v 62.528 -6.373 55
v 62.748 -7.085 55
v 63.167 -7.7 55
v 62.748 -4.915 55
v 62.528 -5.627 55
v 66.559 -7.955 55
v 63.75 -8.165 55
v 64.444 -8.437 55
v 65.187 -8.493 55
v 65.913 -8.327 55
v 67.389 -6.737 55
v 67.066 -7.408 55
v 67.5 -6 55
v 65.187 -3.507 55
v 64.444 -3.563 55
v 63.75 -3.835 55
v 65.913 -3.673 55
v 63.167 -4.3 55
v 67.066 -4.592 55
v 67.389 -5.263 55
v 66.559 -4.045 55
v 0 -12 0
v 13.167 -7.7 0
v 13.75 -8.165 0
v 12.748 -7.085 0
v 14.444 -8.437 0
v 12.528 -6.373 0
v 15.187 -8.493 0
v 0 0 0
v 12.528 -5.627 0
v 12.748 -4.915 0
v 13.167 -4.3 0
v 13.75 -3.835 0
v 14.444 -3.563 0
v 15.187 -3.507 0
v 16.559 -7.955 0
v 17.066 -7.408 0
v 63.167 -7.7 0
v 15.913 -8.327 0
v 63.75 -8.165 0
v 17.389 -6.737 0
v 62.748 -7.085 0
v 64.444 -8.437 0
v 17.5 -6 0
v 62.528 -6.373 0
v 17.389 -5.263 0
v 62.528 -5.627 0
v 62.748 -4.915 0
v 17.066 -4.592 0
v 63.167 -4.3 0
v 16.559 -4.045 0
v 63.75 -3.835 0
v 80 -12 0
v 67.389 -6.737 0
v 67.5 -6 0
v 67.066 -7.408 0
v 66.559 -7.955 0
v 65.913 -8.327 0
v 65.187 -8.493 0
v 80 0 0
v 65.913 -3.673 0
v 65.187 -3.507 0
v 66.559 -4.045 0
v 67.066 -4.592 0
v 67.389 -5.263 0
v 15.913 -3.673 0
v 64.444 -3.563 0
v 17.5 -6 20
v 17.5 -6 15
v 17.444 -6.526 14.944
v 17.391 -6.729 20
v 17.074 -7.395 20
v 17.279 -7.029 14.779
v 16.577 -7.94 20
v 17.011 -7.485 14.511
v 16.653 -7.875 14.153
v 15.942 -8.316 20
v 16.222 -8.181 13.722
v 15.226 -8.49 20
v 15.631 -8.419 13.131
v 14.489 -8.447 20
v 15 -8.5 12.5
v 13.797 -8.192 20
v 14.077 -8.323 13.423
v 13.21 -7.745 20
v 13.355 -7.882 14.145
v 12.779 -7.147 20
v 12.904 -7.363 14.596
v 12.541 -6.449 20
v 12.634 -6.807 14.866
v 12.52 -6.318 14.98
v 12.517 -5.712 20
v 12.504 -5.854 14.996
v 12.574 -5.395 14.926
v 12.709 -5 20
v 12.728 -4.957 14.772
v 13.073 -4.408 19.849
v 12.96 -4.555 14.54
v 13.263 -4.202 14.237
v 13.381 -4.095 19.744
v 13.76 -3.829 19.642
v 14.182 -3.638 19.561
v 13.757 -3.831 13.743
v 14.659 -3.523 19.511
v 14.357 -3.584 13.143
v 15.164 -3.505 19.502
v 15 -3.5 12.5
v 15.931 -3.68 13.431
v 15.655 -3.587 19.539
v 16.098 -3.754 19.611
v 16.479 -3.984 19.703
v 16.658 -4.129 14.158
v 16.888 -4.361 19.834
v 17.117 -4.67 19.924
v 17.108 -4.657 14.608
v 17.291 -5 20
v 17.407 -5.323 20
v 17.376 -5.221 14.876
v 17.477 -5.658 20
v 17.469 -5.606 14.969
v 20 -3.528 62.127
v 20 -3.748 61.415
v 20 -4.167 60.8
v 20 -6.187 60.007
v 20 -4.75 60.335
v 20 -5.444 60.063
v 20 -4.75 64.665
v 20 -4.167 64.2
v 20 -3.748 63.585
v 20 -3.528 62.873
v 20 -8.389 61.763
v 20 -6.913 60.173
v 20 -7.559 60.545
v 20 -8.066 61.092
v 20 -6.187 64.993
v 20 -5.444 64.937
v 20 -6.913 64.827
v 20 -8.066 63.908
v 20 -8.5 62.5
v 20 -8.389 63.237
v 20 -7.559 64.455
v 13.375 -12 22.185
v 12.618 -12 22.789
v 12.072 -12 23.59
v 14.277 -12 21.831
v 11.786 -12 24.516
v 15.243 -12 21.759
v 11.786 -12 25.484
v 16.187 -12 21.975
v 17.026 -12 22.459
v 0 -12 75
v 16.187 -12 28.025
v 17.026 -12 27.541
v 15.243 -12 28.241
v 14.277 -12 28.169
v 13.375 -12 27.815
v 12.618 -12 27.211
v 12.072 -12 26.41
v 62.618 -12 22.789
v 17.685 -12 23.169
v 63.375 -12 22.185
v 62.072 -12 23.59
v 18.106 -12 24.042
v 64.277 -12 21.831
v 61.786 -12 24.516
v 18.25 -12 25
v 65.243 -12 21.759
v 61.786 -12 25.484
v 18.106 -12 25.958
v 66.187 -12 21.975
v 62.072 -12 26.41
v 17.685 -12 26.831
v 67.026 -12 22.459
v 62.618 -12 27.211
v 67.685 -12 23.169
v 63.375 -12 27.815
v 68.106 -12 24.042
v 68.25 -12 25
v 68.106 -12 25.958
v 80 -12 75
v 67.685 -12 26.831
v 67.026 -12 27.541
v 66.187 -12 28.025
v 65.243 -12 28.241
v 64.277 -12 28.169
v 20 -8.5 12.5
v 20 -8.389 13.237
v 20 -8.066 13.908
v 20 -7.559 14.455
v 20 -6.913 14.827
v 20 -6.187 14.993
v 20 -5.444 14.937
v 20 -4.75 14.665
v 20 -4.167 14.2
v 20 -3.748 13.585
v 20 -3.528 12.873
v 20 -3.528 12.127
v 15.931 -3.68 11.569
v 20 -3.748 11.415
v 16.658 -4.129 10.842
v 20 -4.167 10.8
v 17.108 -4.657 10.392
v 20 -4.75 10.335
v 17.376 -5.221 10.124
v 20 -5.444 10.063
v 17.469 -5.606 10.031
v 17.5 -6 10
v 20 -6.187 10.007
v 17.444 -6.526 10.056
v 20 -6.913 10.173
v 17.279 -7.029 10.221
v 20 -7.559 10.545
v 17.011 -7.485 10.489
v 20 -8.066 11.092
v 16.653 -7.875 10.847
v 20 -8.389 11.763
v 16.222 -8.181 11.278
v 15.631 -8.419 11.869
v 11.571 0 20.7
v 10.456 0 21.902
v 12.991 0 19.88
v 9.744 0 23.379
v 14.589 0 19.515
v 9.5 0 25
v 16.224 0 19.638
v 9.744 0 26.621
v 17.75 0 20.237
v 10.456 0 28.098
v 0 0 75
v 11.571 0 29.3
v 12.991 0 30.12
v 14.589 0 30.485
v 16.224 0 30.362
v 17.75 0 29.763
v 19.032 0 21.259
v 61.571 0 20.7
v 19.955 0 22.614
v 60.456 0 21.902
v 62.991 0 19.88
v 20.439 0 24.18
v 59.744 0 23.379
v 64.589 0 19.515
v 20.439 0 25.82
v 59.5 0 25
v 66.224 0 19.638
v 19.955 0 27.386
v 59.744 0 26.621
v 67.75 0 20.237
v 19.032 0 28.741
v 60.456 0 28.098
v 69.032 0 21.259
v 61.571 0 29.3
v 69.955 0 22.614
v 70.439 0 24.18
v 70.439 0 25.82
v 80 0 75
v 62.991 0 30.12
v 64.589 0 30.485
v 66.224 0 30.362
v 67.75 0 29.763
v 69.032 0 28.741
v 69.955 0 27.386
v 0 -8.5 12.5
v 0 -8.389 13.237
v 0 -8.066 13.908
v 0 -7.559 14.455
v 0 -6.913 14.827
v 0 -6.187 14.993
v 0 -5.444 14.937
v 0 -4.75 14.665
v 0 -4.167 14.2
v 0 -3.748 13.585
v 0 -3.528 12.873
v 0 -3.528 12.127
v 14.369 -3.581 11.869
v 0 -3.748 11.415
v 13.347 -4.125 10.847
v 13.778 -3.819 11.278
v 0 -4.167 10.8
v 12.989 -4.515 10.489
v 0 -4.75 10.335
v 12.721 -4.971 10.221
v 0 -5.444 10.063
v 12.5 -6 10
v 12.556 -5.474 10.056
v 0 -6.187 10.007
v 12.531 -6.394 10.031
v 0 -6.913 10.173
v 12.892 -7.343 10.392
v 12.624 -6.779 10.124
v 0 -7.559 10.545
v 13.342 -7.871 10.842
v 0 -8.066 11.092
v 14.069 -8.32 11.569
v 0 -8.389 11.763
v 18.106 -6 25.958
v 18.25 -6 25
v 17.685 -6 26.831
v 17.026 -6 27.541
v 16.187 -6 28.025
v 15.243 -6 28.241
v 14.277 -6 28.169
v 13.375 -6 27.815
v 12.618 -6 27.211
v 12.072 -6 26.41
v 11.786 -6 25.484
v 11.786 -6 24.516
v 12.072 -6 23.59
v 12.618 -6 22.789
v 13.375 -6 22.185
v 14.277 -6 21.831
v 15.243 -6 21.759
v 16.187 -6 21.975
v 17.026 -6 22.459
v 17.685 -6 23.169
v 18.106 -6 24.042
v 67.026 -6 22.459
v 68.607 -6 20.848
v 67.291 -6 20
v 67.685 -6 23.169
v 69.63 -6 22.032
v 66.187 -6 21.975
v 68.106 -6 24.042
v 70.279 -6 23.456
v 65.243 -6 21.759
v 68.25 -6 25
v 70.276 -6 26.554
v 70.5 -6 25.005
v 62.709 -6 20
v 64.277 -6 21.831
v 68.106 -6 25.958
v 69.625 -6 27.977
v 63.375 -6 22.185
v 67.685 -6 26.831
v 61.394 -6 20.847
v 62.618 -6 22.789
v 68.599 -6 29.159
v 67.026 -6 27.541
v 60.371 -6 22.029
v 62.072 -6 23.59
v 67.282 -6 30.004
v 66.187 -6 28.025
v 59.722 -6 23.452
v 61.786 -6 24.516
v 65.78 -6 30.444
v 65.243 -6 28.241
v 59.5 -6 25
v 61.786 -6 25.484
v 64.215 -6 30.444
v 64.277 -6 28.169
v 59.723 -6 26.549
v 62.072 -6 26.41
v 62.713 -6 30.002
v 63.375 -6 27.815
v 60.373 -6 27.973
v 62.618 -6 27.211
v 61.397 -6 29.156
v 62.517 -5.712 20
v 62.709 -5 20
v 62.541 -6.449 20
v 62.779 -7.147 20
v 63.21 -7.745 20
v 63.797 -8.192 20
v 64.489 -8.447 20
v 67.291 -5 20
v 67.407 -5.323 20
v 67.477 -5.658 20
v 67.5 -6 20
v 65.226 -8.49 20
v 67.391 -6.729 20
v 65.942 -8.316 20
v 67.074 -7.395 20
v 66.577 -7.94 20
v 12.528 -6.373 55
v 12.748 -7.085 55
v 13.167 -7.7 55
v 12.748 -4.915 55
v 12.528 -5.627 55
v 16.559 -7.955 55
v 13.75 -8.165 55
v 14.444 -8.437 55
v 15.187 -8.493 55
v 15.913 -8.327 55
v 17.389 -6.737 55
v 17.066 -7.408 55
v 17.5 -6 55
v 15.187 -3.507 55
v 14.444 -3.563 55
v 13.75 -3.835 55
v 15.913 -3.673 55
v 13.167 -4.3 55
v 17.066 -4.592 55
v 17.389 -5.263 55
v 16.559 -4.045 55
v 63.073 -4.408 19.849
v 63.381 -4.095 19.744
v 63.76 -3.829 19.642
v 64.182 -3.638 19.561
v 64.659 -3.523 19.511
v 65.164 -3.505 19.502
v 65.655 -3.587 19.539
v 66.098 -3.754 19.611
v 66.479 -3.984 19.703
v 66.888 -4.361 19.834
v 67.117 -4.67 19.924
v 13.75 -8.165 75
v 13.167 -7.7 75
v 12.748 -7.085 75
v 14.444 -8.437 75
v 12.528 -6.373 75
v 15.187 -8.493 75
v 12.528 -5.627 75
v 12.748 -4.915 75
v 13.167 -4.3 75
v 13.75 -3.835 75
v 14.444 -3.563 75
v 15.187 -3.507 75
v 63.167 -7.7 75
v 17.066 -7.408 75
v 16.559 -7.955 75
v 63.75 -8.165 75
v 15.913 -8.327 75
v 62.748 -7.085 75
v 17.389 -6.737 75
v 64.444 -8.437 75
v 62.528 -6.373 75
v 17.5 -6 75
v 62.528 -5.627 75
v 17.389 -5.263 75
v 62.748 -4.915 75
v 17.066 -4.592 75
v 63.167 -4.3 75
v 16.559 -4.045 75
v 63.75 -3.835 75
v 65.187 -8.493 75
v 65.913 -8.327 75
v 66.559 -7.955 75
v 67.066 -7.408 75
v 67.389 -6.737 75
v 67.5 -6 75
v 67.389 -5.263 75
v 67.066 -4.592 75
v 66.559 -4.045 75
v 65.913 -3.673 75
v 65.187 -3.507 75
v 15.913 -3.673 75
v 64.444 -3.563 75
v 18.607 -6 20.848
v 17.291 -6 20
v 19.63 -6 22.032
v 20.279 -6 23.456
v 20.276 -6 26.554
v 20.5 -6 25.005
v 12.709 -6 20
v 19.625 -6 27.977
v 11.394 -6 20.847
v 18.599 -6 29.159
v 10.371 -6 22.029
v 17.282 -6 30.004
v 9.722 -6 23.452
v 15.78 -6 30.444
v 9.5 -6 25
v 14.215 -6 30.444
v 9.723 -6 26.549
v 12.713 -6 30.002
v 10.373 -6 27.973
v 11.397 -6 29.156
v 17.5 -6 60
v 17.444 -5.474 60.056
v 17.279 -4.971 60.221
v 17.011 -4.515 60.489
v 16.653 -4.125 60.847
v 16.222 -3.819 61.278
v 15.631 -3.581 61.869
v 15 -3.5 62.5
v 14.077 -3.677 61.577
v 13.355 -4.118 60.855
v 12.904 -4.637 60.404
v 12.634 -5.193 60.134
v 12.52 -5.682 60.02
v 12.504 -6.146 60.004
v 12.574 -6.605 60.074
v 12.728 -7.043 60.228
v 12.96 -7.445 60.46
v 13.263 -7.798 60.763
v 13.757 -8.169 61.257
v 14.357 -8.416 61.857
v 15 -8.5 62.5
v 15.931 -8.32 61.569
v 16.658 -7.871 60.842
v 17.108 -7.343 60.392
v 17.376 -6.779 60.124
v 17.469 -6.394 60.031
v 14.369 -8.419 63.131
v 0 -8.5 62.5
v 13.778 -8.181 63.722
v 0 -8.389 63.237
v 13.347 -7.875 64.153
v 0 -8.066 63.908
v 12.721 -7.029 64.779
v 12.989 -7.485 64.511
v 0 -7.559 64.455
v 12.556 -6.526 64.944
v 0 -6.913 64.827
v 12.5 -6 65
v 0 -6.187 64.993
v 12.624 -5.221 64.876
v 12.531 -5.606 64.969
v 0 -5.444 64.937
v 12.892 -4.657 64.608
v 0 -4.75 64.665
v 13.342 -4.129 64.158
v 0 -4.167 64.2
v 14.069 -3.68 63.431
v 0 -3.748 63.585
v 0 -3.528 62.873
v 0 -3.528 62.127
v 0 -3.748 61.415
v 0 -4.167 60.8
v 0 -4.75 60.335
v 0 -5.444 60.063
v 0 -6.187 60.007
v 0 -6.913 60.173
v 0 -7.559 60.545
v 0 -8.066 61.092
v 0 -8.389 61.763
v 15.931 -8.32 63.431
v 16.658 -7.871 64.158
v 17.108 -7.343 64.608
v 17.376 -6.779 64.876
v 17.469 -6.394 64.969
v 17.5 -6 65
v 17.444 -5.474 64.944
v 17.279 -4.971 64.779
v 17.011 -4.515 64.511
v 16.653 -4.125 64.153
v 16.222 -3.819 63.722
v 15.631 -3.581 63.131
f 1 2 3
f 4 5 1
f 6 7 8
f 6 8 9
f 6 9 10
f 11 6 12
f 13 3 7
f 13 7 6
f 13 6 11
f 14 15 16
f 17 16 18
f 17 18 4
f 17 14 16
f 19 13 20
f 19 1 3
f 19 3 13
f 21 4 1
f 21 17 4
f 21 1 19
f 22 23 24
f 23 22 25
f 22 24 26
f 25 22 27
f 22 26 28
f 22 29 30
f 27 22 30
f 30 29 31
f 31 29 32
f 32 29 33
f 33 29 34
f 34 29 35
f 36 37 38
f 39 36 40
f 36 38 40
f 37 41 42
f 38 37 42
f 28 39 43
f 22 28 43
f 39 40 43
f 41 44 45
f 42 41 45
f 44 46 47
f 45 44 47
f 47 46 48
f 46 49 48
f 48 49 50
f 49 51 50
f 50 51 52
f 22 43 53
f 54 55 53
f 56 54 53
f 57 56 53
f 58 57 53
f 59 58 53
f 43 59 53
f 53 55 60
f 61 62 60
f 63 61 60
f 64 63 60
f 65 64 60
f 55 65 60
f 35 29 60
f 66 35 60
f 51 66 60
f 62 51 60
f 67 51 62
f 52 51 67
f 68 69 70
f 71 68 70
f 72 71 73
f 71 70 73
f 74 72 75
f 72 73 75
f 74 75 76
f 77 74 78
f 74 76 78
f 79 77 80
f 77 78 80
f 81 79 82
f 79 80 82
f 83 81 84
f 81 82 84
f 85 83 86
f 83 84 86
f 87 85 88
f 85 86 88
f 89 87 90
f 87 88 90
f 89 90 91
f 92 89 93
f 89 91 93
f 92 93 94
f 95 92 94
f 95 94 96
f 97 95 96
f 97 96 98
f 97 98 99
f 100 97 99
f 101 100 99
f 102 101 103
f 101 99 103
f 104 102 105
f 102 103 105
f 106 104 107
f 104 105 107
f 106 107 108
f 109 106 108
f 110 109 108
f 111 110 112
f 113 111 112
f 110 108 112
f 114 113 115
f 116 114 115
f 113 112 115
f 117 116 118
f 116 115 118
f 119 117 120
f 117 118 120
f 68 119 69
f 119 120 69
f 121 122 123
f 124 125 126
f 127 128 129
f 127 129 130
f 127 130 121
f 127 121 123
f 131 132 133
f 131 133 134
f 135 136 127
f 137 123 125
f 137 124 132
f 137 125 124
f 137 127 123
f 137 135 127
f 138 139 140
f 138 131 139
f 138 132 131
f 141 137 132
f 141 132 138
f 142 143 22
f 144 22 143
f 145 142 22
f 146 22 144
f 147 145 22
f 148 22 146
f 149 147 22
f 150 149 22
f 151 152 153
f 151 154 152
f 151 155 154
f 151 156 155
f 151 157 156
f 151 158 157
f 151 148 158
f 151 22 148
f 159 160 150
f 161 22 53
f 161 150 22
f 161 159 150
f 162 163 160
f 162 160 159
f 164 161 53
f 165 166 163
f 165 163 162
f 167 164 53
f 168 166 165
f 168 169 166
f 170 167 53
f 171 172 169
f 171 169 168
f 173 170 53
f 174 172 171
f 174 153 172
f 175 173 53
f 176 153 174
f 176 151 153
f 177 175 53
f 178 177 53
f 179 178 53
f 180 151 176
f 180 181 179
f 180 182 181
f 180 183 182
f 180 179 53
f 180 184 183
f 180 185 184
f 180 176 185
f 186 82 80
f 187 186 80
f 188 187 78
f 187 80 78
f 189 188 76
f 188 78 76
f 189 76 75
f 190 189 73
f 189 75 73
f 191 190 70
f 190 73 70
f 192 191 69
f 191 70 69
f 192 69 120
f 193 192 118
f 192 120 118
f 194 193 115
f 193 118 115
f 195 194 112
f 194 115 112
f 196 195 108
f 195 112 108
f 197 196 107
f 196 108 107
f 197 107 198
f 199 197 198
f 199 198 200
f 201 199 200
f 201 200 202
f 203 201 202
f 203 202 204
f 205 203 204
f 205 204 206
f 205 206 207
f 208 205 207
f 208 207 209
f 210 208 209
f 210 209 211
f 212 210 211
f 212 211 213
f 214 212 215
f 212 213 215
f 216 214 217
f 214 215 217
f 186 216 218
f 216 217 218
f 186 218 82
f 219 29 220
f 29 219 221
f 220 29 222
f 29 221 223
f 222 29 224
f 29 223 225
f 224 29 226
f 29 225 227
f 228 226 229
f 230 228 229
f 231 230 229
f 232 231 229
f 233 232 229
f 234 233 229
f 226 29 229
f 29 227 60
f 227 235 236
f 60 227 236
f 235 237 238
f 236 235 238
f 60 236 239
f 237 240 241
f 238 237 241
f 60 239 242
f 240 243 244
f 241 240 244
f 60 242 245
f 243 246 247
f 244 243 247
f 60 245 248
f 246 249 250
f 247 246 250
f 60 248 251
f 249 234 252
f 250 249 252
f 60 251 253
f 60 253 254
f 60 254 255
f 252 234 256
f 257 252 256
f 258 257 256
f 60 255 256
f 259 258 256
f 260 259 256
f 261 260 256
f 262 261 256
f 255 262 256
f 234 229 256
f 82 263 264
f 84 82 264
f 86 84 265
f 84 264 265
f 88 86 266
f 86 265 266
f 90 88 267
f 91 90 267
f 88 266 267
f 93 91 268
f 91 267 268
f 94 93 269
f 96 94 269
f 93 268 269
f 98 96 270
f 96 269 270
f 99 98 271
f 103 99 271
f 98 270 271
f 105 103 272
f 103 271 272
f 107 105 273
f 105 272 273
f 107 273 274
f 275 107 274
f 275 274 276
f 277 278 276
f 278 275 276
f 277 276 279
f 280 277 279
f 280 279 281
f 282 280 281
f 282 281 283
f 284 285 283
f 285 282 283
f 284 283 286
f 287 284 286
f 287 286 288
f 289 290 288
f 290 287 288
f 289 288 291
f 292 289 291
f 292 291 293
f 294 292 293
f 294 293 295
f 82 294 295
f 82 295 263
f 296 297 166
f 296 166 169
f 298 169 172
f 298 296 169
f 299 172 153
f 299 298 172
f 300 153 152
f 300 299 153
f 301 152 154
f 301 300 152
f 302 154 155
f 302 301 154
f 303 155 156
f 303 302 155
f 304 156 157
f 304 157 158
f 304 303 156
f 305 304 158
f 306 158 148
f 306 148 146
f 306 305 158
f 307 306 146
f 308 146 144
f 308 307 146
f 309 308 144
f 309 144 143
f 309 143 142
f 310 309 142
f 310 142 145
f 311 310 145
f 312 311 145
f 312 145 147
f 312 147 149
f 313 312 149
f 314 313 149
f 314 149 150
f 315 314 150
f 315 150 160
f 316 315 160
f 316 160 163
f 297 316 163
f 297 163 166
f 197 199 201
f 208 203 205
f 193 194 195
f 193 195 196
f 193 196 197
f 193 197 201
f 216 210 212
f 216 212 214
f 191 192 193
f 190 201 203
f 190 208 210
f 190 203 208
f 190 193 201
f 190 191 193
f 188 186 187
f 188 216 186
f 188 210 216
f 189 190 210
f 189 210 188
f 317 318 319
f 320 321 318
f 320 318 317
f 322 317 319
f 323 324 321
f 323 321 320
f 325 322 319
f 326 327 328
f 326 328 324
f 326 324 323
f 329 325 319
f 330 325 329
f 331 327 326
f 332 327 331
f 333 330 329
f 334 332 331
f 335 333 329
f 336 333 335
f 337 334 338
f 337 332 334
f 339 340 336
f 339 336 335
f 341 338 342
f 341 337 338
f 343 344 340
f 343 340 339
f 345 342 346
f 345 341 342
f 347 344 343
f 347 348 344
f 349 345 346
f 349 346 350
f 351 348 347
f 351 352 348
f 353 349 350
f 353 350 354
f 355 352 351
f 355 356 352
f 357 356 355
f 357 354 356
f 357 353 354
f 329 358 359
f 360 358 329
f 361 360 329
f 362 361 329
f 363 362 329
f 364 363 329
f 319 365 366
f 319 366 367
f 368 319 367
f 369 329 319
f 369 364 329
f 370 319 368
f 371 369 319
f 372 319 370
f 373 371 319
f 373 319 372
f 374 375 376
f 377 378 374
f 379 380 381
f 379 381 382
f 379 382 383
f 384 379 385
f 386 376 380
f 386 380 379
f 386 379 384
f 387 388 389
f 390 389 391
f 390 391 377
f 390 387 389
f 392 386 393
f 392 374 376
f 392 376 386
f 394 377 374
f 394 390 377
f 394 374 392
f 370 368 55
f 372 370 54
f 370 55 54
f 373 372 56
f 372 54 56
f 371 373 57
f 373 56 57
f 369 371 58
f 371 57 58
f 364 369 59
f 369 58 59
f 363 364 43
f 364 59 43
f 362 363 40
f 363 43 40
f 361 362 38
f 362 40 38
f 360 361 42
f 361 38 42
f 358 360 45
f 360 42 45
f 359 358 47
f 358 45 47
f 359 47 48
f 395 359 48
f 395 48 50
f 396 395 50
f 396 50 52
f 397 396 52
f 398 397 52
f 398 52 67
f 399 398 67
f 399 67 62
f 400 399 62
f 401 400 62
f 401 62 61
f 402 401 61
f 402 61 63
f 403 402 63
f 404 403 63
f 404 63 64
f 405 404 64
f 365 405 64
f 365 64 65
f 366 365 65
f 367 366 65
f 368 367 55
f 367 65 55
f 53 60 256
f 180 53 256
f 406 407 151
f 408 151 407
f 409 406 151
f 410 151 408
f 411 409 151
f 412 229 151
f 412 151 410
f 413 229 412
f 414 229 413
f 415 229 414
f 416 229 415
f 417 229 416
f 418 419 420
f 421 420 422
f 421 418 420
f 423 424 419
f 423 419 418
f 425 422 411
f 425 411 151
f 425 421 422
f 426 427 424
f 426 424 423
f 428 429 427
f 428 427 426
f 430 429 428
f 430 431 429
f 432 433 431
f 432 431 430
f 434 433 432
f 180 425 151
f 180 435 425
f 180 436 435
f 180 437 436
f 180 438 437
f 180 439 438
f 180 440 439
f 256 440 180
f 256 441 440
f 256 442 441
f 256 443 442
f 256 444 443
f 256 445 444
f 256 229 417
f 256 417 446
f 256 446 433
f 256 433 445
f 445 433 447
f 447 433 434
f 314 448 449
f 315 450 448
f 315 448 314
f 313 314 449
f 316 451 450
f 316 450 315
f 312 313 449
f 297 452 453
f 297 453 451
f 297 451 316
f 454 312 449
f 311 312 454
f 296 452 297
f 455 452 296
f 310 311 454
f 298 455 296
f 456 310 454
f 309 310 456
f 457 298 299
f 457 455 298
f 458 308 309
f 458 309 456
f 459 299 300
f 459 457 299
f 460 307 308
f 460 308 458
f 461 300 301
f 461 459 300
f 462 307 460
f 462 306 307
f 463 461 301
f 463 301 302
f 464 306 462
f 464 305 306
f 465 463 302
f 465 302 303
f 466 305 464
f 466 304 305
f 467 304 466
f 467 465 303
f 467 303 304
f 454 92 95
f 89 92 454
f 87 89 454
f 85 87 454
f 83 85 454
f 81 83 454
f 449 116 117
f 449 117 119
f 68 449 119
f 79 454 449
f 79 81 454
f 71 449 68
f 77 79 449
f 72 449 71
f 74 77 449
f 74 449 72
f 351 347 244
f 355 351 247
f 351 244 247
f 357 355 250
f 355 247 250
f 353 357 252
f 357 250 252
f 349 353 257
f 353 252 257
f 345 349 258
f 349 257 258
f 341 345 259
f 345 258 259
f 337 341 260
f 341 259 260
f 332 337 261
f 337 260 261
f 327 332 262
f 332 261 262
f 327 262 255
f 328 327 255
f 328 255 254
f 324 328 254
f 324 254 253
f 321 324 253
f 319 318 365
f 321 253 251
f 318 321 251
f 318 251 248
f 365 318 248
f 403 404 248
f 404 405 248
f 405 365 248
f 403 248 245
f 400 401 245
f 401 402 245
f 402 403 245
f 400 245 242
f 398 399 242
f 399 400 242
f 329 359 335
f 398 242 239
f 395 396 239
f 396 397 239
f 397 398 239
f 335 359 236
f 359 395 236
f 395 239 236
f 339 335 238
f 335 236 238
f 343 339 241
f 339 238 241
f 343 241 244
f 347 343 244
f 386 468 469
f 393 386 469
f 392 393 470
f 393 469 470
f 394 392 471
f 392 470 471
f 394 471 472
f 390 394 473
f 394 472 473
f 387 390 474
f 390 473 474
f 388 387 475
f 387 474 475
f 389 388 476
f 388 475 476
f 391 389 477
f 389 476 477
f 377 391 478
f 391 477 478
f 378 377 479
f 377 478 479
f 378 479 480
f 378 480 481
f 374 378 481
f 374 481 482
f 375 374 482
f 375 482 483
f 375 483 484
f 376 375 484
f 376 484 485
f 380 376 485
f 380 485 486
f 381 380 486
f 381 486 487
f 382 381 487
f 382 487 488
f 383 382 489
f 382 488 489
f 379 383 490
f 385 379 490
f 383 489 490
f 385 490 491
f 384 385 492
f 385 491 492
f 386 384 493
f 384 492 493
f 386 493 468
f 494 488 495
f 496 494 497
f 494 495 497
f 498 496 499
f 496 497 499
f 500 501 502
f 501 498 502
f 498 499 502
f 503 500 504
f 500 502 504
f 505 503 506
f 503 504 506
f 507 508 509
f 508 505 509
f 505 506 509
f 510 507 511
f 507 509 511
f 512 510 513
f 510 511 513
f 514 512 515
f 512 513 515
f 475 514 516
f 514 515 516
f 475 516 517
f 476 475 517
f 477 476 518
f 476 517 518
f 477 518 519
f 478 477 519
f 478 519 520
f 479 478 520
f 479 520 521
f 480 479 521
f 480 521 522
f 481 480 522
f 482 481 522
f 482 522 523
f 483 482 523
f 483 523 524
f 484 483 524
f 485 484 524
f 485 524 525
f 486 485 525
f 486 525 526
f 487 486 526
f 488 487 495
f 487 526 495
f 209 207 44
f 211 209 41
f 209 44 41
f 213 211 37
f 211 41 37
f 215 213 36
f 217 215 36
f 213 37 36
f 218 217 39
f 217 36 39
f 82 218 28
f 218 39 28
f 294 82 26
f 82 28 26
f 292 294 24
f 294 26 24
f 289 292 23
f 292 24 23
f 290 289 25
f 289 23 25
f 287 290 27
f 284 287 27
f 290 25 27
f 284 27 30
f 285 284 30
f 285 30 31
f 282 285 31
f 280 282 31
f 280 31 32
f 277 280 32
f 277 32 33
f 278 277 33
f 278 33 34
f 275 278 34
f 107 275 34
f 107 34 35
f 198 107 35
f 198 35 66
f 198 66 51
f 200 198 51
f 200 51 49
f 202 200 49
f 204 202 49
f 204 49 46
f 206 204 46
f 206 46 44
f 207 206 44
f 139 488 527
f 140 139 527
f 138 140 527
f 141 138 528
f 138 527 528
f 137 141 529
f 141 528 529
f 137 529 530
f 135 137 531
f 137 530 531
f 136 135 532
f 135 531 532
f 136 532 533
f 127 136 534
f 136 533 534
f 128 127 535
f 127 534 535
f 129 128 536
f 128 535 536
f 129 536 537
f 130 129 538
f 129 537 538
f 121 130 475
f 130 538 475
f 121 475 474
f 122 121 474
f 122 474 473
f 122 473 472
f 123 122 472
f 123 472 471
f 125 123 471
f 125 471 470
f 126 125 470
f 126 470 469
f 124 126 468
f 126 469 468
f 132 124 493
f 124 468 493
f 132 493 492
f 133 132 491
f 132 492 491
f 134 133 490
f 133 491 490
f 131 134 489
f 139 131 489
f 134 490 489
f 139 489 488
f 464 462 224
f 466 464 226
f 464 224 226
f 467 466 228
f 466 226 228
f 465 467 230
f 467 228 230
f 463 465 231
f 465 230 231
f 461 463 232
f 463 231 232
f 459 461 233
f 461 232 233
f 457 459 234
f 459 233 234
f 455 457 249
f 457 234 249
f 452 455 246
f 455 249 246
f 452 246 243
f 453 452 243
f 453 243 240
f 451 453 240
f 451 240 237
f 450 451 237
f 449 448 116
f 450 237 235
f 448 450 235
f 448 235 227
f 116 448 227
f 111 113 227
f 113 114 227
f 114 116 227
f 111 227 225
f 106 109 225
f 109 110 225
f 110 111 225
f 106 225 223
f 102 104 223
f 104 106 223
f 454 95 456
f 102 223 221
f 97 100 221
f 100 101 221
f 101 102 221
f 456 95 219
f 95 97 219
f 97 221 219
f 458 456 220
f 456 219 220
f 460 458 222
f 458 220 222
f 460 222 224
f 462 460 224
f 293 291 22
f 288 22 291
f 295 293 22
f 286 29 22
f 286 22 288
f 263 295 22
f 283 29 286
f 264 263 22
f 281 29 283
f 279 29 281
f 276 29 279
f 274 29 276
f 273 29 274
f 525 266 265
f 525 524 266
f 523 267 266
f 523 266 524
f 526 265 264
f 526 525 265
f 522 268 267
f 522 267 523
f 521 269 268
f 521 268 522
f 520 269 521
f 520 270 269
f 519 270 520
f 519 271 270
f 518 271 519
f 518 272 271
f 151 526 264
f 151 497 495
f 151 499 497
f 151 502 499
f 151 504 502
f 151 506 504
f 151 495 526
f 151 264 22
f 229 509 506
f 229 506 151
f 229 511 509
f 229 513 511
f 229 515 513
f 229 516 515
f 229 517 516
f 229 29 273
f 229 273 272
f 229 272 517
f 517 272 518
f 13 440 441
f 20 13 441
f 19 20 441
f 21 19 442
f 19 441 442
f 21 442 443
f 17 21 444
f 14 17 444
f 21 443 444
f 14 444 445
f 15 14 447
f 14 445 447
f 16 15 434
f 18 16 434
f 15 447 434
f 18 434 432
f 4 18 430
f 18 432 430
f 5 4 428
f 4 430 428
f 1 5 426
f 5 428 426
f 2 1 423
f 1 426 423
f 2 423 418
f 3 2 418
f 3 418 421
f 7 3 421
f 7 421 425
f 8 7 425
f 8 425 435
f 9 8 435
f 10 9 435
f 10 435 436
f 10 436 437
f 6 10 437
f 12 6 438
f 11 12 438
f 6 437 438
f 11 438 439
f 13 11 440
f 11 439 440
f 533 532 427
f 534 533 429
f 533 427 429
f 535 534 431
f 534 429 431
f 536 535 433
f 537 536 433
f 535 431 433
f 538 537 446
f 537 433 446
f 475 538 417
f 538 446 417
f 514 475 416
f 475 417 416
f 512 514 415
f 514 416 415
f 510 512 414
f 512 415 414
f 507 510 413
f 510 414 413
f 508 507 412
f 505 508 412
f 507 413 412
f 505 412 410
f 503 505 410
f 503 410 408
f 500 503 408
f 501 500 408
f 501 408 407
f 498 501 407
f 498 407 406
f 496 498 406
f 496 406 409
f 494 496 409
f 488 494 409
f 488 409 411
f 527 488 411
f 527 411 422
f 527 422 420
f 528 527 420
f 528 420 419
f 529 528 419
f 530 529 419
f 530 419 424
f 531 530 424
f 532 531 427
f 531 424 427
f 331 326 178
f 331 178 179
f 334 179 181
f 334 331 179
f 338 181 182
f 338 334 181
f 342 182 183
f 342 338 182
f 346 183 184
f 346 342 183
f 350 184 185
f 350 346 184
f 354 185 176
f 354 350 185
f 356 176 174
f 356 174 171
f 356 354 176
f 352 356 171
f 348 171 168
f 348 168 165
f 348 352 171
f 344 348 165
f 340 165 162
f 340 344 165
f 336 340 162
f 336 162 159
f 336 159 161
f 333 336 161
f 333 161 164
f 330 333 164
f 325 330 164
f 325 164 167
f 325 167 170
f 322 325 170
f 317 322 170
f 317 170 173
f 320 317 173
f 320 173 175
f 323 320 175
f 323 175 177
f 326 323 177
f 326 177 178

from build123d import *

# Parameters (mm, degrees)
F0_W     = 80
F0_H     = 75
F0_R     = 3.25
F1_DEPTH = 12
F2_R     = 5.5
F3_DEPTH = 6
F4_R     = 2.5
F5_DEPTH = 20
F6_R     = 2.5
F7_DEPTH = 20
F8_R     = 2.5
F9_DEPTH = 20


with BuildPart() as f1:
    # F0 (on Front) → F1 (new body)
    with BuildSketch(Plane.XZ):
        with Locations((40, 37.5)):
            Rectangle(F0_W, F0_H)
        with Locations((15, 25)):
            Circle(F0_R, mode=Mode.SUBTRACT)
        with Locations((65, 25)):
            Circle(F0_R, mode=Mode.SUBTRACT)
    extrude(amount=F1_DEPTH)

    # F2 (on face) → F3 (cut)
    with BuildSketch(Plane(origin=(0, 0, 0), x_dir=(-1, 0, 0), z_dir=(0, 1, 0))):
        with Locations((-15, 25)):
            Circle(F2_R)
        with Locations((-65, 25)):
            Circle(F2_R)
    extrude(amount=-F3_DEPTH, mode=Mode.SUBTRACT)

    # F4 (on face) → F5 (cut)
    with BuildSketch(Plane(origin=(0, 0, 0), x_dir=(1, 0, 0), z_dir=(0, 0, -1))):
        with Locations((15, 6)):
            Circle(F4_R)
        with Locations((65, 6)):
            Circle(F4_R)
    extrude(amount=-F5_DEPTH, mode=Mode.SUBTRACT)

    # F6 (on face) → F7 (cut)
    with BuildSketch(Plane.XY.offset(75)):
        with Locations((15, -6)):
            Circle(F6_R)
        with Locations((65, -6)):
            Circle(F6_R)
    extrude(amount=-F7_DEPTH, mode=Mode.SUBTRACT)

    # F8 (on face) → F9 (cut)
    with BuildSketch(Plane(origin=(0, 0, 0), x_dir=(0, -1, 0), z_dir=(-1, 0, 0))):
        with Locations((6, 62.5)):
            Circle(F8_R)
        with Locations((6, 12.5)):
            Circle(F8_R)
    extrude(amount=-F9_DEPTH, mode=Mode.SUBTRACT)


solid = f1.part
